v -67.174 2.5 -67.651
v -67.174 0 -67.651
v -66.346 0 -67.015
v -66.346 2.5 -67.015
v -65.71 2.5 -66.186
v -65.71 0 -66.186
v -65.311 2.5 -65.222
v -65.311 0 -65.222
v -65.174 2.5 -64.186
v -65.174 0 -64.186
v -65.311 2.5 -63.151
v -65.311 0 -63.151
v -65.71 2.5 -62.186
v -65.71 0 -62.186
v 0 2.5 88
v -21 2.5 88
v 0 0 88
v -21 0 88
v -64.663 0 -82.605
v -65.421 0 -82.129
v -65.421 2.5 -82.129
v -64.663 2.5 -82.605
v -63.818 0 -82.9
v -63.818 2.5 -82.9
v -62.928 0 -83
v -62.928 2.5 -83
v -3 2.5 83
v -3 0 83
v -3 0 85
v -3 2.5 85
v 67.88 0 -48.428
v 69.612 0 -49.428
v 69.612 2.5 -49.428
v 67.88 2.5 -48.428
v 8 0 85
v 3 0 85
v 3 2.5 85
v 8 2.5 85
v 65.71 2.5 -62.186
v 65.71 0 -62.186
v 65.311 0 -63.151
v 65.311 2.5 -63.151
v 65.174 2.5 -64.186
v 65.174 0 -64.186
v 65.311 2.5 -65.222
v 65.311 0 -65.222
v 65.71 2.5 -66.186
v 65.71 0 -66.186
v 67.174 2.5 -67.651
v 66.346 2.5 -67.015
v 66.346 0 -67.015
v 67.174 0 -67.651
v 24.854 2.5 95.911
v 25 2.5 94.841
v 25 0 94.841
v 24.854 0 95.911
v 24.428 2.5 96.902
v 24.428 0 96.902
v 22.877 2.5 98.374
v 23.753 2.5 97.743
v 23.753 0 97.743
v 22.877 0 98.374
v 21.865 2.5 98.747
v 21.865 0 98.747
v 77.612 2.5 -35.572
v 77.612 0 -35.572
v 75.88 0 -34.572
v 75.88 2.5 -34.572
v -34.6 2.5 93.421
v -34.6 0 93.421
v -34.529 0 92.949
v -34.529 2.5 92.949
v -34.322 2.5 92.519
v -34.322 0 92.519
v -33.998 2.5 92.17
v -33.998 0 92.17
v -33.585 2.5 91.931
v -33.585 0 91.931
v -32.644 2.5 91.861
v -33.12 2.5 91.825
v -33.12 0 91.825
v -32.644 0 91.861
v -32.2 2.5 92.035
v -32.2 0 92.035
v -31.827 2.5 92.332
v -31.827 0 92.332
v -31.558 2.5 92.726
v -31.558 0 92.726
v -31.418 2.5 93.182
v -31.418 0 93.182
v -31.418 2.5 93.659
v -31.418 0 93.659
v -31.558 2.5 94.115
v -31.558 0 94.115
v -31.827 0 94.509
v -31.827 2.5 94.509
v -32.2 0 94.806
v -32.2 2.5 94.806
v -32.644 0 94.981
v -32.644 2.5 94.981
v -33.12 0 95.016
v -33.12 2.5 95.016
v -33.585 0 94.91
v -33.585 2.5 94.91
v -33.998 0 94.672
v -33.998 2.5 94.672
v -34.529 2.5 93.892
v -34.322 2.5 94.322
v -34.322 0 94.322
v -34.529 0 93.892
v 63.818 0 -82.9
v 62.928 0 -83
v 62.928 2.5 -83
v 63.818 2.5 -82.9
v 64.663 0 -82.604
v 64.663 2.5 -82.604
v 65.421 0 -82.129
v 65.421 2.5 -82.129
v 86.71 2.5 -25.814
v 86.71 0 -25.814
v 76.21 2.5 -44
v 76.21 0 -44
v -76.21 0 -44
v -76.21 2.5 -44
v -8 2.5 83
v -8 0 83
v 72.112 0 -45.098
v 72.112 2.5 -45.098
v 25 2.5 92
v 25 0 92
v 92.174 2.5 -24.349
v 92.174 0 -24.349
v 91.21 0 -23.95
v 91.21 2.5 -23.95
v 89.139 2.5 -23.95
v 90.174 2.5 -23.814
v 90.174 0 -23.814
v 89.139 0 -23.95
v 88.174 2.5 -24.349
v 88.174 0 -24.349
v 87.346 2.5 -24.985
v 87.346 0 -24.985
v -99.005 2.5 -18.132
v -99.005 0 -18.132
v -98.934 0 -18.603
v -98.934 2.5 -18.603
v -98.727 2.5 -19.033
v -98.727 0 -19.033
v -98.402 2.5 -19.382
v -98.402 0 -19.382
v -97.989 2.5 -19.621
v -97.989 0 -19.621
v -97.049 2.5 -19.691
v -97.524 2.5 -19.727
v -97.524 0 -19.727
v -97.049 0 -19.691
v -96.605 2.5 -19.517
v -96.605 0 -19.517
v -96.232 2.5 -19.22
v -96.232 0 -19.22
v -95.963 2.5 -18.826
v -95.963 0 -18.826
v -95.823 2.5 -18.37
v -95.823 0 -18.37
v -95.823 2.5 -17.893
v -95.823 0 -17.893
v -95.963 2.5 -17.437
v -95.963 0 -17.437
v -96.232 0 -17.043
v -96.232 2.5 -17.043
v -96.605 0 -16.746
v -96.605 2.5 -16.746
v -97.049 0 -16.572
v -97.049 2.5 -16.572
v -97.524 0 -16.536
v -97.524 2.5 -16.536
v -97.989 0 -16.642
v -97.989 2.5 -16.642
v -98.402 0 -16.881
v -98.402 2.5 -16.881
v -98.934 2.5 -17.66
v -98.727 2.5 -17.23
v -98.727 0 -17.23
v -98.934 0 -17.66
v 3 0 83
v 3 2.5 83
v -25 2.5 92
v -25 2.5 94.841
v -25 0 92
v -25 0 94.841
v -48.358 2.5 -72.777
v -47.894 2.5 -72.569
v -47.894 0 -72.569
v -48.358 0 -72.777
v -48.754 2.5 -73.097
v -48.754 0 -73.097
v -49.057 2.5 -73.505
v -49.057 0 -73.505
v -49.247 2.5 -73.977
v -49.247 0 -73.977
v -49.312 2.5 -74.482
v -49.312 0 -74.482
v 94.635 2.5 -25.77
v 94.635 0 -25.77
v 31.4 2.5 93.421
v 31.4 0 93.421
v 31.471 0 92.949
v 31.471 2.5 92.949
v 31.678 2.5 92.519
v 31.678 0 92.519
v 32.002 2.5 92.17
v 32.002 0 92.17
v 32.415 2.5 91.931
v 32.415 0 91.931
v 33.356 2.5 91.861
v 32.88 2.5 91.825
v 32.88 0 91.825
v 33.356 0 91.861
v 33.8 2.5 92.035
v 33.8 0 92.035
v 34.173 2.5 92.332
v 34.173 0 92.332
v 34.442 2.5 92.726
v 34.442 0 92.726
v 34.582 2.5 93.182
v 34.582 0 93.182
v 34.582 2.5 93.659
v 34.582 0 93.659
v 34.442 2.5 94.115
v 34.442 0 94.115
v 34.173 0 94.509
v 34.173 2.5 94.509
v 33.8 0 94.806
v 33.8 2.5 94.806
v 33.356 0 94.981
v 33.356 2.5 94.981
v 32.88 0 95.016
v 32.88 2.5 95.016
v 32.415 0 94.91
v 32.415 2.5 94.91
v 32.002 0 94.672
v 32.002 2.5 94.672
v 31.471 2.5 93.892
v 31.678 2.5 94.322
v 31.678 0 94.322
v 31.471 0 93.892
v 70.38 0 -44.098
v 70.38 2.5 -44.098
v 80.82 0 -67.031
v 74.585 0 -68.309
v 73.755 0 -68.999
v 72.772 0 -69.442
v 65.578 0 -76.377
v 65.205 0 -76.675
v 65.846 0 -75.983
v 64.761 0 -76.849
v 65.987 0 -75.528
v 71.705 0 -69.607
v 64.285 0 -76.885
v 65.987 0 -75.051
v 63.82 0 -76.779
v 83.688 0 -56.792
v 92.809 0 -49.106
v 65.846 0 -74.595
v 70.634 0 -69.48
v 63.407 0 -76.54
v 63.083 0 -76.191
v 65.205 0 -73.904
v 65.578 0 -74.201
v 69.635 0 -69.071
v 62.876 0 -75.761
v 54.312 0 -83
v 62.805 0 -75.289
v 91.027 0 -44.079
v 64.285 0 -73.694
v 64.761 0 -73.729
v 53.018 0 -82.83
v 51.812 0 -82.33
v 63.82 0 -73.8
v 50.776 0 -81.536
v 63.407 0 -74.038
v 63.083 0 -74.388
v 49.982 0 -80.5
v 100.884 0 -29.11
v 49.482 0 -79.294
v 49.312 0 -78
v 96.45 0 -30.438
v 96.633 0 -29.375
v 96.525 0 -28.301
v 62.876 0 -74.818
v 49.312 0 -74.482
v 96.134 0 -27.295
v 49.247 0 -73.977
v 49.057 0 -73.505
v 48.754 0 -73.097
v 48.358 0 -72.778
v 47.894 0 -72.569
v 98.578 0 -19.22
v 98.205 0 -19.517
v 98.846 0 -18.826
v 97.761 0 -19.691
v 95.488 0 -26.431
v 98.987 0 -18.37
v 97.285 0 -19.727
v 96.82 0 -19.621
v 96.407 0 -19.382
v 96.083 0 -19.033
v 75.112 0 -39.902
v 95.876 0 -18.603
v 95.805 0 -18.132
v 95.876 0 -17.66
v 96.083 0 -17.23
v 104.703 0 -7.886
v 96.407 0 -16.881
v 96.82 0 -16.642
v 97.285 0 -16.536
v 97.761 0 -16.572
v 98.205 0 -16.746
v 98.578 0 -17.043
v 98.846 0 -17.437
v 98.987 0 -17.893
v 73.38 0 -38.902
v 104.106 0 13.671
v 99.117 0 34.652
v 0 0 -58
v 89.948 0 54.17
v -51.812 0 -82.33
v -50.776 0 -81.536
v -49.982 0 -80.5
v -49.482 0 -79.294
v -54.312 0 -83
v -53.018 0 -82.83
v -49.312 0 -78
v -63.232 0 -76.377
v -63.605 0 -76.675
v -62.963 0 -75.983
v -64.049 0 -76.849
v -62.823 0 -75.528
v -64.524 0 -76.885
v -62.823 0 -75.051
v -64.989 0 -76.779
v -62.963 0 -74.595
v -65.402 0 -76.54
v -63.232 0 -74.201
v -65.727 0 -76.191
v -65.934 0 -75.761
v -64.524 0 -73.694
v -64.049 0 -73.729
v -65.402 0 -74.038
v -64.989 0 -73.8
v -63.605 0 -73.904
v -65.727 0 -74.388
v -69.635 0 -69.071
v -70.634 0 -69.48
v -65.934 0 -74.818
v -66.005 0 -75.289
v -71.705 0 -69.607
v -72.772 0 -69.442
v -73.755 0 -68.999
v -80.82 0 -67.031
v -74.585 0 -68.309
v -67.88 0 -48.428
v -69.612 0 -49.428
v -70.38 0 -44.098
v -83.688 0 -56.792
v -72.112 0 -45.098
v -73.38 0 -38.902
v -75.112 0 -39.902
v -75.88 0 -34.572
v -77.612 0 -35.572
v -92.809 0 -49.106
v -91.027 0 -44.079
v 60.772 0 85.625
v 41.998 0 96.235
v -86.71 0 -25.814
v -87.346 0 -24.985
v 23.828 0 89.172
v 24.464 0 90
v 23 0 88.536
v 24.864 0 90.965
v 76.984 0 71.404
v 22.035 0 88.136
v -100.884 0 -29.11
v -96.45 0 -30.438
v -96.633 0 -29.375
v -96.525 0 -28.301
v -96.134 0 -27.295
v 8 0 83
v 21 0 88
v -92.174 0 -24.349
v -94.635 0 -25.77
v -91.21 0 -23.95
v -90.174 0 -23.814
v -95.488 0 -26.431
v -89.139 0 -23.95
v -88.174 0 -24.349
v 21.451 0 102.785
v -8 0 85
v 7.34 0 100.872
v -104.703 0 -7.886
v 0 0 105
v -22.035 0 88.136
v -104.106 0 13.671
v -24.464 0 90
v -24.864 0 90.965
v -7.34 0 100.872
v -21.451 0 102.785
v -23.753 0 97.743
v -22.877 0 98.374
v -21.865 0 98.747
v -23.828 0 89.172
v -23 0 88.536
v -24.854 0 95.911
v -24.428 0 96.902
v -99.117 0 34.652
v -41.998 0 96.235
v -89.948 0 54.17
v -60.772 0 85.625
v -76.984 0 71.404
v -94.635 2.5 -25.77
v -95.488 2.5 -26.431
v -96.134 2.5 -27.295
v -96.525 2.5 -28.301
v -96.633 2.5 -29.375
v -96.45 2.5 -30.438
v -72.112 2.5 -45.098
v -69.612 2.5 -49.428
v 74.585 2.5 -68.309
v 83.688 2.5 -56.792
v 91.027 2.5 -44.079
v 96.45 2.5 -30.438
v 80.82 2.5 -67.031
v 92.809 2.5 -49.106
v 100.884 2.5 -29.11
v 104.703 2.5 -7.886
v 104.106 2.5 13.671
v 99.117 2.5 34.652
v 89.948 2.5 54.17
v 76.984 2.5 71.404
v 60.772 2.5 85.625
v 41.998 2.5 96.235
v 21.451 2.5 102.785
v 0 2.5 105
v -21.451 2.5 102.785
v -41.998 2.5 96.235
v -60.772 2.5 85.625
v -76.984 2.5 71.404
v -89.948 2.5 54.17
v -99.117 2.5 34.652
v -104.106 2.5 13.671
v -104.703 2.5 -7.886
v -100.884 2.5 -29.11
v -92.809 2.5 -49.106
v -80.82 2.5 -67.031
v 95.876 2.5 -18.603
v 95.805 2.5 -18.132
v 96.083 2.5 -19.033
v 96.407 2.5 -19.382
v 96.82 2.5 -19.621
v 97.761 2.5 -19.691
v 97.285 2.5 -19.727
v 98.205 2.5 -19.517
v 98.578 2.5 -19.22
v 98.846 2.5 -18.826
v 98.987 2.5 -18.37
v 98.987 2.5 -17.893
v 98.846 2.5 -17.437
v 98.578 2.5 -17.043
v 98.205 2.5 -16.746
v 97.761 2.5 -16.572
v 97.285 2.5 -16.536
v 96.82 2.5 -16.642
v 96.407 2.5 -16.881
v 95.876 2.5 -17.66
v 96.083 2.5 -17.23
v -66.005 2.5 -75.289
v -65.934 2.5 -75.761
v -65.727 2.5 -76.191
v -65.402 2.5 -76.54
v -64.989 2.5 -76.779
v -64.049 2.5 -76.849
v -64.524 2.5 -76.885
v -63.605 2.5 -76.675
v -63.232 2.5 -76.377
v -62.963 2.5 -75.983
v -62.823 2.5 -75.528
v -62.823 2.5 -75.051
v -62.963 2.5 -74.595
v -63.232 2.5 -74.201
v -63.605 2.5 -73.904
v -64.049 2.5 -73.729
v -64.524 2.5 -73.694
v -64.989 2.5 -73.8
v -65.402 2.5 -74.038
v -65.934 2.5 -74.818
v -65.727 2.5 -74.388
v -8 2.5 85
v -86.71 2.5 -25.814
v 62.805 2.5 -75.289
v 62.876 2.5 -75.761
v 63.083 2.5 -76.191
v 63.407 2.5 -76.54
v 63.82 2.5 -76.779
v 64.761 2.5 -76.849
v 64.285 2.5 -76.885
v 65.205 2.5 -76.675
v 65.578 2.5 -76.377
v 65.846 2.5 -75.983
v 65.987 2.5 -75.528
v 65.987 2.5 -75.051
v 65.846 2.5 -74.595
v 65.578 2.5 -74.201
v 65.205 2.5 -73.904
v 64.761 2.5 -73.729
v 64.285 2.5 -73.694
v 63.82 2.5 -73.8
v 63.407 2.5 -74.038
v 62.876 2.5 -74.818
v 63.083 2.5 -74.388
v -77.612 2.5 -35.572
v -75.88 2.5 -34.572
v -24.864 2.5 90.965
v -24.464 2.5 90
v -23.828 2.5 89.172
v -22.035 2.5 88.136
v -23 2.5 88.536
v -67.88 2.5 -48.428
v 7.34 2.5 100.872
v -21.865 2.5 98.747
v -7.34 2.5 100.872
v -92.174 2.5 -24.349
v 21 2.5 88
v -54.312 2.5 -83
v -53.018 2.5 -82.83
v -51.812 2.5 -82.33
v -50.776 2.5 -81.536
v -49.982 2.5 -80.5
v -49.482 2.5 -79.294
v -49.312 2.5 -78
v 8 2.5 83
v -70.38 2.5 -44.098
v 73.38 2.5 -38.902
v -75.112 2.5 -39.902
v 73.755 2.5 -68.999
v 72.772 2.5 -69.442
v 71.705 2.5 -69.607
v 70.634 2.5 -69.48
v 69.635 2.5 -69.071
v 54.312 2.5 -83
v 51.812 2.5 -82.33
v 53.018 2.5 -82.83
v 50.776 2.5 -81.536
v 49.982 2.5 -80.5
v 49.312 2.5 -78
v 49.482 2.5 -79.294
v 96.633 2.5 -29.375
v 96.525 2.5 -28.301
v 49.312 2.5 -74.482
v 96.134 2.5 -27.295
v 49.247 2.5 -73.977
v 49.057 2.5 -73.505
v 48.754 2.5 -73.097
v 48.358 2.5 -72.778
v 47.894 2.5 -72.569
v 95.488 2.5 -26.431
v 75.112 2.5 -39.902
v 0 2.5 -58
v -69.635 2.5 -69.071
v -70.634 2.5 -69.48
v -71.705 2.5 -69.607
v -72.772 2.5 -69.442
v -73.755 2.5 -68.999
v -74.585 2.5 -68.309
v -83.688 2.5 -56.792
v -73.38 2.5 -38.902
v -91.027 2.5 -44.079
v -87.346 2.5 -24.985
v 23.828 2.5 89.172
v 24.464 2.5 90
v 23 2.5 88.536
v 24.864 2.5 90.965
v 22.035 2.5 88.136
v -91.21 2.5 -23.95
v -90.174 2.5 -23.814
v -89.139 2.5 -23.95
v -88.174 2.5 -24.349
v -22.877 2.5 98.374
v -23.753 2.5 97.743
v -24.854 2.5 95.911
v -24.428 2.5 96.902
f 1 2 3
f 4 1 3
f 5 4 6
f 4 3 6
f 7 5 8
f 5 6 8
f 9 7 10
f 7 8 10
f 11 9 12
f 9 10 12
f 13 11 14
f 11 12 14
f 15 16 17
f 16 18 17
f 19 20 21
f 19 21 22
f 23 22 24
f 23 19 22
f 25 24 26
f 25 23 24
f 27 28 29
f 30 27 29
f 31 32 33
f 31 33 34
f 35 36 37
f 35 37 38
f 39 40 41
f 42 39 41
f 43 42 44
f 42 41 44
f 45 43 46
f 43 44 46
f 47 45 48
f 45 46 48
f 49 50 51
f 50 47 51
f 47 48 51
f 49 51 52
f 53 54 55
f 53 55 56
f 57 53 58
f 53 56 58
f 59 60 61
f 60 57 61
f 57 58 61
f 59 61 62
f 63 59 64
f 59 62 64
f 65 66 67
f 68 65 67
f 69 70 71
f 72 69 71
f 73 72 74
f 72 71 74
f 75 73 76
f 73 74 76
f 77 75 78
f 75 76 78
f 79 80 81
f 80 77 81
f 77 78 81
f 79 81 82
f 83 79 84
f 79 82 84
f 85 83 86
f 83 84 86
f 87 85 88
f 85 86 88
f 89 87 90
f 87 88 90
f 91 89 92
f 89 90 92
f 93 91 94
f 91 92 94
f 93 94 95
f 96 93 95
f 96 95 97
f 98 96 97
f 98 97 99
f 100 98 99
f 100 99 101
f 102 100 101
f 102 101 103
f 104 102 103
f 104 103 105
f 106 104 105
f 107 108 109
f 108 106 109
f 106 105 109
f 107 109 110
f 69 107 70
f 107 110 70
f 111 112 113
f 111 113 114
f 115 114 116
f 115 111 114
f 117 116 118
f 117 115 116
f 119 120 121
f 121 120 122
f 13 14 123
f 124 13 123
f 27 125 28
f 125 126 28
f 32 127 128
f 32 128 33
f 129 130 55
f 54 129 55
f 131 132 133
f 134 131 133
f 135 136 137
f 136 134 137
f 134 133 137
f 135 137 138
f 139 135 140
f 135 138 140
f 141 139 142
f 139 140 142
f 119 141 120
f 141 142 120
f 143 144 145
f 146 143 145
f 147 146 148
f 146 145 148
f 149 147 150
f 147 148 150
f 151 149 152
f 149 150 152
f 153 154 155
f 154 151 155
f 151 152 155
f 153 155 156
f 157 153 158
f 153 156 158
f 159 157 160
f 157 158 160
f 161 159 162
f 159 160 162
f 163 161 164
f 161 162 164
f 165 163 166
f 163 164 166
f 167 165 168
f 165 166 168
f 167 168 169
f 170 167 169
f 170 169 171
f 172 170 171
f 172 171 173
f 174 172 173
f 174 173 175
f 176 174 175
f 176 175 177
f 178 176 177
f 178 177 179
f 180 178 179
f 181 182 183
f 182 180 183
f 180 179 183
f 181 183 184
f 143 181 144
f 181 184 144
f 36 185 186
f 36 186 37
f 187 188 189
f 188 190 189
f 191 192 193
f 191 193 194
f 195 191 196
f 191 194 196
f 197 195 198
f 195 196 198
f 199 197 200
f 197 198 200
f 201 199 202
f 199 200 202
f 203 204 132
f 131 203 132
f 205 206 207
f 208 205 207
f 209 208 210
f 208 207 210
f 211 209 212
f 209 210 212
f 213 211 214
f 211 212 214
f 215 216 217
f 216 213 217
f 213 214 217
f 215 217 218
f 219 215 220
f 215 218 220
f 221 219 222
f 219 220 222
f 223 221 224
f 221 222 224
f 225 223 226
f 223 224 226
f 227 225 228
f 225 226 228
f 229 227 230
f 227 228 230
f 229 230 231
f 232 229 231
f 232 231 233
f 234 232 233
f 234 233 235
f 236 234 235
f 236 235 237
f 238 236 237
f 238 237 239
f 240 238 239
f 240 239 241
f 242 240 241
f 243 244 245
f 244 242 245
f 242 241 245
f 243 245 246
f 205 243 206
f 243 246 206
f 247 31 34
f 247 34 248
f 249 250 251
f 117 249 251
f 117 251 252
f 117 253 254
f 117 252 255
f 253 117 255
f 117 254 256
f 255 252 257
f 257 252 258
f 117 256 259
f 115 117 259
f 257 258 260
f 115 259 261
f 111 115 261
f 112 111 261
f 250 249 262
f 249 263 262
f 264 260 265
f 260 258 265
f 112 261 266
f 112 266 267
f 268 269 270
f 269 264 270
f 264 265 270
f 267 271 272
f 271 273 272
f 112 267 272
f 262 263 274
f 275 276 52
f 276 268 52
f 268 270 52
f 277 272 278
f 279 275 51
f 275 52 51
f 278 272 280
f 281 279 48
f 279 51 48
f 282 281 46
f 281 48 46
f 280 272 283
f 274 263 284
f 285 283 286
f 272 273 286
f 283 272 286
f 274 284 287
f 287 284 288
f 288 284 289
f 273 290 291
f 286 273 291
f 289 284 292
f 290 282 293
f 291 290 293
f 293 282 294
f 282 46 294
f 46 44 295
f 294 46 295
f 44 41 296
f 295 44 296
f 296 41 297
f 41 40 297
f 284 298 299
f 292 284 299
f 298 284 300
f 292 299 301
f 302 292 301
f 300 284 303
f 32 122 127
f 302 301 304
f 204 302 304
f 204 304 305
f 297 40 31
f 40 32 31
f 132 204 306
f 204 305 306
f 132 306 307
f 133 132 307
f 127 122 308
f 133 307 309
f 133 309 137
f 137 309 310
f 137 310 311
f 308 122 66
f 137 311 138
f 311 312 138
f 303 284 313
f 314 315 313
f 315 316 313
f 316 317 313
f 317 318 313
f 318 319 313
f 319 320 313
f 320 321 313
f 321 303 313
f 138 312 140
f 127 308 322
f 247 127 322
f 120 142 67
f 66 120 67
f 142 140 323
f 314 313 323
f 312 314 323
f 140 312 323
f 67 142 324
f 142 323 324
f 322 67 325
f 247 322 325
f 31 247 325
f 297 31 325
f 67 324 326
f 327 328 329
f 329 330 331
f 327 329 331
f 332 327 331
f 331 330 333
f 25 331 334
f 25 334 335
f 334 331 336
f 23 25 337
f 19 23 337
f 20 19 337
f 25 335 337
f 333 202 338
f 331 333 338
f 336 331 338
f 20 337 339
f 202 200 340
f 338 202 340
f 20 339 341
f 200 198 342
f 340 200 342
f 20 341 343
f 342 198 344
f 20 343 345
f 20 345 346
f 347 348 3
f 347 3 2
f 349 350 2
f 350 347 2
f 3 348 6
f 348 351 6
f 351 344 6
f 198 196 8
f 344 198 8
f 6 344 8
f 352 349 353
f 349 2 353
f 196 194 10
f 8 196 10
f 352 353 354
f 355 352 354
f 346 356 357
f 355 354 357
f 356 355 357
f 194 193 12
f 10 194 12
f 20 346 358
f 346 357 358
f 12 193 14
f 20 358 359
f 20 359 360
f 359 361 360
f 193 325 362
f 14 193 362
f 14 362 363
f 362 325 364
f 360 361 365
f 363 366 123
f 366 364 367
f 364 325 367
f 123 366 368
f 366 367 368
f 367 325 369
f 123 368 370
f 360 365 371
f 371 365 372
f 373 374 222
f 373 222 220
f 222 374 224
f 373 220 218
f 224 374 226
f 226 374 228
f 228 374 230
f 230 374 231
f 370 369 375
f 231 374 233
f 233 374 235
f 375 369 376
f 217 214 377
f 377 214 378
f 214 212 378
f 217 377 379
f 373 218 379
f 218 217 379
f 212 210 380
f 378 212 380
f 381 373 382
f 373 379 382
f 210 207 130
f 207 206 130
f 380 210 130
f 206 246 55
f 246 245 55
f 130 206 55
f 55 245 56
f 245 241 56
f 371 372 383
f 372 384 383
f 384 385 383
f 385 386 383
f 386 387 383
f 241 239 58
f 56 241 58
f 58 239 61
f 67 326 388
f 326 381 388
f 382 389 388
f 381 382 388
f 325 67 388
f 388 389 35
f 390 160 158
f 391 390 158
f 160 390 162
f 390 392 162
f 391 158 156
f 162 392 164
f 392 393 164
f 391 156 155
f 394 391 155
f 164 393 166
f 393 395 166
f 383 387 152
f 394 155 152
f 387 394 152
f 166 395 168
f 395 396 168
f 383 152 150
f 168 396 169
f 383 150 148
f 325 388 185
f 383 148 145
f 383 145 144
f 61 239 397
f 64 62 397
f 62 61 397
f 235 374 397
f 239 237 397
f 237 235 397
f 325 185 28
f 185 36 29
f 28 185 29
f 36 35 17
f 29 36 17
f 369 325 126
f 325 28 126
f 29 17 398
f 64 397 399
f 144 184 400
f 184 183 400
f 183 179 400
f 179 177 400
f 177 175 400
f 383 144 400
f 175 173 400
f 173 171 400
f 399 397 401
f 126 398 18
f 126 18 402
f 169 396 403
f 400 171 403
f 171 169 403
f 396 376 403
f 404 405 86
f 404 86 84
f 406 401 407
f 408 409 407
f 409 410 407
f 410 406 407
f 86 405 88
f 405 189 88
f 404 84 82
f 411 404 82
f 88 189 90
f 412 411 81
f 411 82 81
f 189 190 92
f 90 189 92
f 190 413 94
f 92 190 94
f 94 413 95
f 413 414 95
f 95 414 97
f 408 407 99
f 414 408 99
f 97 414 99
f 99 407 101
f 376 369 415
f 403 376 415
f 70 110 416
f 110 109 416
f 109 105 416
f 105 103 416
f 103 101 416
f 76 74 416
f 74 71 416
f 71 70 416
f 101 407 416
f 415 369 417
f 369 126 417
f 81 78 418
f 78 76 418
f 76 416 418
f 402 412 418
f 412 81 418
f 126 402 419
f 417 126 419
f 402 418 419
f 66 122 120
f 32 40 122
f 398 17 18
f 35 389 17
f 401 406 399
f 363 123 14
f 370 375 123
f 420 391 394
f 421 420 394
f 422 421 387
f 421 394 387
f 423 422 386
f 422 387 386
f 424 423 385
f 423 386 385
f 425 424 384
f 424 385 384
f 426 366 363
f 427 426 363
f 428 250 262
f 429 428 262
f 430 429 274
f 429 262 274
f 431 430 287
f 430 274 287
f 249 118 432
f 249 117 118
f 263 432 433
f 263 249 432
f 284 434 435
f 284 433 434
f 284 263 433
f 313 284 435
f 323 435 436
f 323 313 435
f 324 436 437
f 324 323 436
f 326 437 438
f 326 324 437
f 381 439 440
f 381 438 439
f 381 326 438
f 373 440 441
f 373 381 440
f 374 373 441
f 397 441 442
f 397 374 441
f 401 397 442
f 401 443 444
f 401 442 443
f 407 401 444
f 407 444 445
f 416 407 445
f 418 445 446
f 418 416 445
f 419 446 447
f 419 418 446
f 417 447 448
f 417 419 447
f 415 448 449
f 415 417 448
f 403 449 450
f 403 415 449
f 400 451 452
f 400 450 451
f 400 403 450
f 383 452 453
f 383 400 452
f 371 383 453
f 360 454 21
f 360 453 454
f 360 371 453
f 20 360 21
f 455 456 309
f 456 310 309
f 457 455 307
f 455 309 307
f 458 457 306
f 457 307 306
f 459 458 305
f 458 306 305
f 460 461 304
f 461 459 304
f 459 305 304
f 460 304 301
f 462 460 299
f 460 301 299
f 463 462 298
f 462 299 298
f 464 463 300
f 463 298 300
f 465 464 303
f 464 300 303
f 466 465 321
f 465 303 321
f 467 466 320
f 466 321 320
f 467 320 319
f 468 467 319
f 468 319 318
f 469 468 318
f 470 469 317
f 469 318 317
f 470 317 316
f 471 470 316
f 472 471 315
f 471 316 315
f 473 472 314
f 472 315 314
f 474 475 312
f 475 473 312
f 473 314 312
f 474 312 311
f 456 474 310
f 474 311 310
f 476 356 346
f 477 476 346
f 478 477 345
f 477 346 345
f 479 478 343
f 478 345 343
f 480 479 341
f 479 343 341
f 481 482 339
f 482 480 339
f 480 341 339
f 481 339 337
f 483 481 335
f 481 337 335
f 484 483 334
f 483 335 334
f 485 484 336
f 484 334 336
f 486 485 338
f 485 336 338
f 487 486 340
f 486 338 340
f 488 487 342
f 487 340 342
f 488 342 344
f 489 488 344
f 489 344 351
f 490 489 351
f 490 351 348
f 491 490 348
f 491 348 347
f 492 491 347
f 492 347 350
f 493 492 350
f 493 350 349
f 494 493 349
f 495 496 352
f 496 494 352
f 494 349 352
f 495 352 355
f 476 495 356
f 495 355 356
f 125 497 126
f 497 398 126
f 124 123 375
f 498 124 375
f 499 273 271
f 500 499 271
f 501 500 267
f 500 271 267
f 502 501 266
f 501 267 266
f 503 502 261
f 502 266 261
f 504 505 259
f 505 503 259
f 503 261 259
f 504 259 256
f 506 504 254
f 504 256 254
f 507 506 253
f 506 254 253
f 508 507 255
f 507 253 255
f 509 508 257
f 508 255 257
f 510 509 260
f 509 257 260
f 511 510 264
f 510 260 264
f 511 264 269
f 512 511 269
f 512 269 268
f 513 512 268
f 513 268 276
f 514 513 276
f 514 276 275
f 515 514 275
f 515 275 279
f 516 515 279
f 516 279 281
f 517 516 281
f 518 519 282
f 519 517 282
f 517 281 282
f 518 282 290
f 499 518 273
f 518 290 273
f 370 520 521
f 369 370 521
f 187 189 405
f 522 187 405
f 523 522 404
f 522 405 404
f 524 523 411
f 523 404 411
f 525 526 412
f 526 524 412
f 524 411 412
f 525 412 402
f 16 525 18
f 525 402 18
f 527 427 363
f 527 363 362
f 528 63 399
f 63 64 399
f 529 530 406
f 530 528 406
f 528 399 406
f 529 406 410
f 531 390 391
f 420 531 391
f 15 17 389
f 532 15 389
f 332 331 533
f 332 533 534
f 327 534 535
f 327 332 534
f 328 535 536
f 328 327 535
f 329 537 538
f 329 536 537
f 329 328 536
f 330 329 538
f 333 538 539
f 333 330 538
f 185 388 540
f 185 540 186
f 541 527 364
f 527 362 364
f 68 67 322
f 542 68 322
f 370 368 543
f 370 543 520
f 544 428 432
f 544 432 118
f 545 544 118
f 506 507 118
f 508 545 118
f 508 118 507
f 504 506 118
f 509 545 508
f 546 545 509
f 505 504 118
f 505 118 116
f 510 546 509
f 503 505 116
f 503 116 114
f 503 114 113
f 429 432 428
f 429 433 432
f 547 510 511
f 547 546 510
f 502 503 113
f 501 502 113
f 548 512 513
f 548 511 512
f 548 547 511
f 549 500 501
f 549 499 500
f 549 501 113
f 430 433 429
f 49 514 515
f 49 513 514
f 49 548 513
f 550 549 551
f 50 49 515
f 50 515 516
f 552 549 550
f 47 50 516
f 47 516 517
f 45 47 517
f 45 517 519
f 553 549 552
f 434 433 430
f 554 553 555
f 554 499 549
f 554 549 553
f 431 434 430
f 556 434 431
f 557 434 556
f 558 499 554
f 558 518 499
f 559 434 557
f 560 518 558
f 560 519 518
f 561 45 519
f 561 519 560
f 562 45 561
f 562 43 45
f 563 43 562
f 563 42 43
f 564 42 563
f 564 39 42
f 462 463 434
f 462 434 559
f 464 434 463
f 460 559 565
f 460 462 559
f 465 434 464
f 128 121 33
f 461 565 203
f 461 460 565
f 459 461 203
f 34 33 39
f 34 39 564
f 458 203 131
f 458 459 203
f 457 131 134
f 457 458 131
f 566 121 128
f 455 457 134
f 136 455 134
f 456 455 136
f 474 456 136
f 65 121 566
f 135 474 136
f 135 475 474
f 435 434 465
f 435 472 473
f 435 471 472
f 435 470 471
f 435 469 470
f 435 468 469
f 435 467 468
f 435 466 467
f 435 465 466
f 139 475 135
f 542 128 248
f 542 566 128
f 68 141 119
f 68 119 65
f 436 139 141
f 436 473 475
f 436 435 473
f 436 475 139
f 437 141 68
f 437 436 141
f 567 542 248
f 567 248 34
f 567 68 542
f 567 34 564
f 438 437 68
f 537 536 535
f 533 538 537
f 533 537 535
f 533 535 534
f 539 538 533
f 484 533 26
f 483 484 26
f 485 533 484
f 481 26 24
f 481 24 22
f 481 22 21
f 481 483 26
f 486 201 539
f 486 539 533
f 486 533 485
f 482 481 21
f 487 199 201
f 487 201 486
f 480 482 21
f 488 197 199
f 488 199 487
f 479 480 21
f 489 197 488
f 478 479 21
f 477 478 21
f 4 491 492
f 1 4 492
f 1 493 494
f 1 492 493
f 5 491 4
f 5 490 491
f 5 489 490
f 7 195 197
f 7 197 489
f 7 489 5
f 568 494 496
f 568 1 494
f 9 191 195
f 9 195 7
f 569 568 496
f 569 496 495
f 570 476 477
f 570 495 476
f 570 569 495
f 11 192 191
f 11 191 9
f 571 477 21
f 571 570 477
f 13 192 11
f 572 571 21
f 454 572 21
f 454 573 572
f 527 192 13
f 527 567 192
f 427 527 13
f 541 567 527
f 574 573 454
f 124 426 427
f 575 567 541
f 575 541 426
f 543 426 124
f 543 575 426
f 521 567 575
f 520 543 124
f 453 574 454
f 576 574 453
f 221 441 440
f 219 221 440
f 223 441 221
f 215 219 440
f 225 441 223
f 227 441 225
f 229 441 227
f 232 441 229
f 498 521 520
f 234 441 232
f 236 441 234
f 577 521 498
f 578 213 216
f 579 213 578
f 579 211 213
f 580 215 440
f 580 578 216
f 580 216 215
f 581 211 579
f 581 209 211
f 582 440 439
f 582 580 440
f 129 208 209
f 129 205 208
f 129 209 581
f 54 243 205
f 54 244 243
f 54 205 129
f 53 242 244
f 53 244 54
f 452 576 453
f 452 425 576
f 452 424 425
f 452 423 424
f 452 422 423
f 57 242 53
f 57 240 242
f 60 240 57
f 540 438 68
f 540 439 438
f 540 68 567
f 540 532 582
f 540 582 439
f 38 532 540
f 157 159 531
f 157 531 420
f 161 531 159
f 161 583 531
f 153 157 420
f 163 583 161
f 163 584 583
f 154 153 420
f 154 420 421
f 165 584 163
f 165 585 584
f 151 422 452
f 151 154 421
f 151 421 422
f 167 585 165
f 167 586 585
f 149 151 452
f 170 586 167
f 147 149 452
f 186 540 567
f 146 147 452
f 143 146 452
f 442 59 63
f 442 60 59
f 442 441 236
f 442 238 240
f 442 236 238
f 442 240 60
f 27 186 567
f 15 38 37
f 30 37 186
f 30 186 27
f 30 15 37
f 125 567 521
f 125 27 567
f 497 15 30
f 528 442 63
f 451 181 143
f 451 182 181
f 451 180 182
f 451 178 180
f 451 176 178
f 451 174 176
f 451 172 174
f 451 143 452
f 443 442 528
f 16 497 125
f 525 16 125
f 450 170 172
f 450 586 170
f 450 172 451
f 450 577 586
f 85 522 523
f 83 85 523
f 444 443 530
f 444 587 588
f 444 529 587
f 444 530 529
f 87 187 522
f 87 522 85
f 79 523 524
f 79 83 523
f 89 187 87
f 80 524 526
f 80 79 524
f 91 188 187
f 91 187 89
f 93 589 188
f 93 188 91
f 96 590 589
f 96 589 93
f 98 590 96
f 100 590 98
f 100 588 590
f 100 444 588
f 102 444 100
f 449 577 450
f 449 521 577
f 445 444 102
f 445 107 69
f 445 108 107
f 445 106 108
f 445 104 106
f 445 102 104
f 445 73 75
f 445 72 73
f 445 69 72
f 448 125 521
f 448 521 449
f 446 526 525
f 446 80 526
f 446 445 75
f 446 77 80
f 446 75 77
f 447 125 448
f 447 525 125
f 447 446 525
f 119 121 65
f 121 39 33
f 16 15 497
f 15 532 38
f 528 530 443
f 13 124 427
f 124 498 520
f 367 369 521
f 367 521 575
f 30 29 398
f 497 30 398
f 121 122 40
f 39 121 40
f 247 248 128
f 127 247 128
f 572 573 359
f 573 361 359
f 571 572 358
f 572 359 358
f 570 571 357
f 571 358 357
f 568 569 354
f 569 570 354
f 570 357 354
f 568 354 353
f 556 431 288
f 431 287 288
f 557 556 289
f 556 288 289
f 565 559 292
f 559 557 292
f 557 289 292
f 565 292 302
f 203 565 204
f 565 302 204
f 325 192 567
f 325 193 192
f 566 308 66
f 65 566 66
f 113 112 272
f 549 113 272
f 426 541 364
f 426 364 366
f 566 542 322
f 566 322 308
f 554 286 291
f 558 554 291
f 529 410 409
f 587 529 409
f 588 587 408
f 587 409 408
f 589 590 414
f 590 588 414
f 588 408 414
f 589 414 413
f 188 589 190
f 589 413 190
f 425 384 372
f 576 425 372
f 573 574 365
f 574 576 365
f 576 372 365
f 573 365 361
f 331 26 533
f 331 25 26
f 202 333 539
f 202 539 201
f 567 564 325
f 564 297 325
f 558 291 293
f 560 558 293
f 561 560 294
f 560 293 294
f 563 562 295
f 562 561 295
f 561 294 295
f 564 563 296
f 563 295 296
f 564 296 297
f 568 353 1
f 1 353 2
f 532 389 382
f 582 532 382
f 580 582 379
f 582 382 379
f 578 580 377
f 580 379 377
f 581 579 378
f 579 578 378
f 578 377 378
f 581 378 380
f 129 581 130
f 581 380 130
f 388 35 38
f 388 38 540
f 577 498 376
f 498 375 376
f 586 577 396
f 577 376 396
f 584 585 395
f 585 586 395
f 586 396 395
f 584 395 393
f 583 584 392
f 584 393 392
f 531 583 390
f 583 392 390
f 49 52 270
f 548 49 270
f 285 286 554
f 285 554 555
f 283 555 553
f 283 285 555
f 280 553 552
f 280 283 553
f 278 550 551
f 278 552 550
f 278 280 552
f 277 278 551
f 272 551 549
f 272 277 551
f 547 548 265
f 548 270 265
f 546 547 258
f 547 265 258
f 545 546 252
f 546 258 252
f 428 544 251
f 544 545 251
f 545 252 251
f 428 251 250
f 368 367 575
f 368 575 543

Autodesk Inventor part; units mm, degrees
ref_plane "YZ Plane" through (0, 0, 0) normal (1, 0, 0) x (0, 1, 0)
ref_plane "XZ Plane" through (0, 0, 0) normal (0, 1, 0) x (-1, 0, 0)
ref_plane "XY Plane" through (0, 0, 0) normal (0, 0, 1) x (1, 0, 0)
sketch "Sketch1" plane through (0, 0, 0) normal (0, 1, 0) x (-1, 0, 0)
  line L0 (-62.9285, -83) -> (-54.3117, -83)
  line L1 (62.9285, -83) -> (54.3117, -83)
  arc A0 (65.4207, -82.1287) -> (-65.4207, -82.1287) centre (0, 0) ccw
  line L2 (-49.3117, -78) -> (-49.3117, -74.4821)
  line L3 (-47.8938, -72.5687) -> (0, -58)
  line L4 (49.3117, -78) -> (49.3117, -74.4821)
  line L5 (47.8938, -72.5687) -> (0, -58)
  arc A1 (49.3117, -78) -> (54.3117, -83) centre (54.3117, -78) ccw
  arc A2 (-54.3117, -83) -> (-49.3117, -78) centre (-54.3117, -78) ccw
  arc A3 (49.3117, -74.4821) -> (47.8938, -72.5687) centre (47.3117, -74.4821) ccw
  arc A4 (-47.8938, -72.5687) -> (-49.3117, -74.4821) centre (-47.3117, -74.4821) ccw
  arc A5 (62.9285, -83) -> (65.4207, -82.1287) centre (62.9285, -79) ccw
  arc A6 (-65.4207, -82.1287) -> (-62.9285, -83) centre (-62.9285, -79) ccw
  line L6 (-76.2102, -44) -> (-65.7102, -62.1865)
  line L7 (-67.1743, -67.6506) -> (-69.6351, -69.0713)
  line L8 (-94.6351, -25.7701) -> (-92.1743, -24.3494)
  line L9 (-86.7102, -25.8135) -> (-76.2102, -44)
  arc A7 (-96.4496, -30.438) -> (-74.5849, -68.3088) centre (0, 0) ccw
  arc A8 (-94.6351, -25.7701) -> (-96.4496, -30.438) centre (-92.6351, -29.2342) ccw
  arc A9 (-86.7102, -25.8135) -> (-92.1743, -24.3494) centre (-90.1743, -27.8135) ccw
  arc A10 (-67.1743, -67.6506) -> (-65.7102, -62.1865) centre (-69.1743, -64.1865) ccw
  arc A11 (-74.5849, -68.3088) -> (-69.6351, -69.0713) centre (-71.6351, -65.6072) ccw
  line L10 (76.2102, -44) -> (86.7102, -25.8135)
  line L11 (92.1743, -24.3494) -> (94.6351, -25.7701)
  line L12 (69.6351, -69.0713) -> (67.1743, -67.6506)
  line L13 (65.7102, -62.1865) -> (76.2102, -44)
  arc A12 (74.5849, -68.3088) -> (96.4496, -30.438) centre (0, 0) ccw
  arc A13 (69.6351, -69.0713) -> (74.5849, -68.3088) centre (71.6351, -65.6072) ccw
  arc A14 (65.7102, -62.1865) -> (67.1743, -67.6506) centre (69.1743, -64.1865) ccw
  arc A15 (92.1743, -24.3494) -> (86.7102, -25.8135) centre (90.1743, -27.8135) ccw
  arc A16 (96.4496, -30.438) -> (94.6351, -25.7701) centre (92.6351, -29.2342) ccw
  line L14 (0, 88) -> (-21, 88)
  line L15 (-25, 92) -> (-25, 94.8414)
  line L16 (25, 94.8414) -> (25, 92)
  line L17 (21, 88) -> (0, 88)
  arc A17 (21.8647, 98.7468) -> (-21.8647, 98.7468) centre (0, 0) ccw
  arc A18 (25, 94.8414) -> (21.8647, 98.7468) centre (21, 94.8414) ccw
  arc A19 (21, 88) -> (25, 92) centre (21, 92) ccw
  arc A20 (-25, 92) -> (-21, 88) centre (-21, 92) ccw
  arc A21 (-21.8647, 98.7468) -> (-25, 94.8414) centre (-21, 94.8414) ccw
  circle A22 centre (-33, 93.4207) radius 1.6
  circle A23 centre (33, 93.4207) radius 1.6
  line L18 (-75.1122, -39.9019) -> (-77.6122, -35.5718)
  line L19 (-77.6122, -35.5718) -> (-75.8801, -34.5718)
  line L20 (-75.8801, -34.5718) -> (-73.3801, -38.9019)
  line L21 (-73.3801, -38.9019) -> (-75.1122, -39.9019)
  line L22 (-72.1122, -45.0981) -> (-69.6122, -49.4282)
  line L23 (-69.6122, -49.4282) -> (-67.8801, -48.4282)
  line L24 (-67.8801, -48.4282) -> (-70.3801, -44.0981)
  line L25 (-70.3801, -44.0981) -> (-72.1122, -45.0981)
  line L26 (72.1122, -45.0981) -> (69.6122, -49.4282)
  line L27 (69.6122, -49.4282) -> (67.8801, -48.4282)
  line L28 (67.8801, -48.4282) -> (70.3801, -44.0981)
  line L29 (70.3801, -44.0981) -> (72.1122, -45.0981)
  line L30 (73.3801, -38.9019) -> (75.1122, -39.9019)
  line L31 (75.8801, -34.5718) -> (73.3801, -38.9019)
  line L32 (77.6122, -35.5718) -> (75.8801, -34.5718)
  line L33 (75.1122, -39.9019) -> (77.6122, -35.5718)
  line L34 (3, 85) -> (8, 85)
  line L35 (8, 85) -> (8, 83)
  line L36 (8, 83) -> (3, 83)
  line L37 (3, 83) -> (3, 85)
  line L38 (-3, 83) -> (-3, 85)
  line L39 (-8, 83) -> (-3, 83)
  line L40 (-8, 85) -> (-8, 83)
  line L41 (-3, 85) -> (-8, 85)
  circle A24 centre (-64.4047, -75.2892) radius 1.6
  circle A25 centre (-97.4047, -18.1315) radius 1.6
  circle A26 centre (97.4047, -18.1315) radius 1.6
  circle A27 centre (64.4047, -75.2892) radius 1.6
  point P0 (64.3117, -83)
  point P1 (-64.3117, -83)
  point P2 (-49.3117, -83)
  point P3 (49.3117, -83)
  point P4 (-49.3117, -73)
  point P5 (49.3117, -73)
  point P6 (-63.7102, -65.6506)
  point P7 (-72.3705, -70.6506)
  point P8 (-97.3705, -27.3494)
  point P9 (88.7102, -22.3494)
  point P10 (97.3705, -27.3494)
  point P11 (-25, 88)
  point P12 (-25, 98)
  dimension "d65" = 360
  dimension "d68" = 3.2
  dimension "d70" = 3.2
  dimension "d79" = 360
  dimension "d83" = 360
extrude "Extrusion1" add sketch "Sketch1" along normal blind 2.5
properties part number "Bottom Plate"
